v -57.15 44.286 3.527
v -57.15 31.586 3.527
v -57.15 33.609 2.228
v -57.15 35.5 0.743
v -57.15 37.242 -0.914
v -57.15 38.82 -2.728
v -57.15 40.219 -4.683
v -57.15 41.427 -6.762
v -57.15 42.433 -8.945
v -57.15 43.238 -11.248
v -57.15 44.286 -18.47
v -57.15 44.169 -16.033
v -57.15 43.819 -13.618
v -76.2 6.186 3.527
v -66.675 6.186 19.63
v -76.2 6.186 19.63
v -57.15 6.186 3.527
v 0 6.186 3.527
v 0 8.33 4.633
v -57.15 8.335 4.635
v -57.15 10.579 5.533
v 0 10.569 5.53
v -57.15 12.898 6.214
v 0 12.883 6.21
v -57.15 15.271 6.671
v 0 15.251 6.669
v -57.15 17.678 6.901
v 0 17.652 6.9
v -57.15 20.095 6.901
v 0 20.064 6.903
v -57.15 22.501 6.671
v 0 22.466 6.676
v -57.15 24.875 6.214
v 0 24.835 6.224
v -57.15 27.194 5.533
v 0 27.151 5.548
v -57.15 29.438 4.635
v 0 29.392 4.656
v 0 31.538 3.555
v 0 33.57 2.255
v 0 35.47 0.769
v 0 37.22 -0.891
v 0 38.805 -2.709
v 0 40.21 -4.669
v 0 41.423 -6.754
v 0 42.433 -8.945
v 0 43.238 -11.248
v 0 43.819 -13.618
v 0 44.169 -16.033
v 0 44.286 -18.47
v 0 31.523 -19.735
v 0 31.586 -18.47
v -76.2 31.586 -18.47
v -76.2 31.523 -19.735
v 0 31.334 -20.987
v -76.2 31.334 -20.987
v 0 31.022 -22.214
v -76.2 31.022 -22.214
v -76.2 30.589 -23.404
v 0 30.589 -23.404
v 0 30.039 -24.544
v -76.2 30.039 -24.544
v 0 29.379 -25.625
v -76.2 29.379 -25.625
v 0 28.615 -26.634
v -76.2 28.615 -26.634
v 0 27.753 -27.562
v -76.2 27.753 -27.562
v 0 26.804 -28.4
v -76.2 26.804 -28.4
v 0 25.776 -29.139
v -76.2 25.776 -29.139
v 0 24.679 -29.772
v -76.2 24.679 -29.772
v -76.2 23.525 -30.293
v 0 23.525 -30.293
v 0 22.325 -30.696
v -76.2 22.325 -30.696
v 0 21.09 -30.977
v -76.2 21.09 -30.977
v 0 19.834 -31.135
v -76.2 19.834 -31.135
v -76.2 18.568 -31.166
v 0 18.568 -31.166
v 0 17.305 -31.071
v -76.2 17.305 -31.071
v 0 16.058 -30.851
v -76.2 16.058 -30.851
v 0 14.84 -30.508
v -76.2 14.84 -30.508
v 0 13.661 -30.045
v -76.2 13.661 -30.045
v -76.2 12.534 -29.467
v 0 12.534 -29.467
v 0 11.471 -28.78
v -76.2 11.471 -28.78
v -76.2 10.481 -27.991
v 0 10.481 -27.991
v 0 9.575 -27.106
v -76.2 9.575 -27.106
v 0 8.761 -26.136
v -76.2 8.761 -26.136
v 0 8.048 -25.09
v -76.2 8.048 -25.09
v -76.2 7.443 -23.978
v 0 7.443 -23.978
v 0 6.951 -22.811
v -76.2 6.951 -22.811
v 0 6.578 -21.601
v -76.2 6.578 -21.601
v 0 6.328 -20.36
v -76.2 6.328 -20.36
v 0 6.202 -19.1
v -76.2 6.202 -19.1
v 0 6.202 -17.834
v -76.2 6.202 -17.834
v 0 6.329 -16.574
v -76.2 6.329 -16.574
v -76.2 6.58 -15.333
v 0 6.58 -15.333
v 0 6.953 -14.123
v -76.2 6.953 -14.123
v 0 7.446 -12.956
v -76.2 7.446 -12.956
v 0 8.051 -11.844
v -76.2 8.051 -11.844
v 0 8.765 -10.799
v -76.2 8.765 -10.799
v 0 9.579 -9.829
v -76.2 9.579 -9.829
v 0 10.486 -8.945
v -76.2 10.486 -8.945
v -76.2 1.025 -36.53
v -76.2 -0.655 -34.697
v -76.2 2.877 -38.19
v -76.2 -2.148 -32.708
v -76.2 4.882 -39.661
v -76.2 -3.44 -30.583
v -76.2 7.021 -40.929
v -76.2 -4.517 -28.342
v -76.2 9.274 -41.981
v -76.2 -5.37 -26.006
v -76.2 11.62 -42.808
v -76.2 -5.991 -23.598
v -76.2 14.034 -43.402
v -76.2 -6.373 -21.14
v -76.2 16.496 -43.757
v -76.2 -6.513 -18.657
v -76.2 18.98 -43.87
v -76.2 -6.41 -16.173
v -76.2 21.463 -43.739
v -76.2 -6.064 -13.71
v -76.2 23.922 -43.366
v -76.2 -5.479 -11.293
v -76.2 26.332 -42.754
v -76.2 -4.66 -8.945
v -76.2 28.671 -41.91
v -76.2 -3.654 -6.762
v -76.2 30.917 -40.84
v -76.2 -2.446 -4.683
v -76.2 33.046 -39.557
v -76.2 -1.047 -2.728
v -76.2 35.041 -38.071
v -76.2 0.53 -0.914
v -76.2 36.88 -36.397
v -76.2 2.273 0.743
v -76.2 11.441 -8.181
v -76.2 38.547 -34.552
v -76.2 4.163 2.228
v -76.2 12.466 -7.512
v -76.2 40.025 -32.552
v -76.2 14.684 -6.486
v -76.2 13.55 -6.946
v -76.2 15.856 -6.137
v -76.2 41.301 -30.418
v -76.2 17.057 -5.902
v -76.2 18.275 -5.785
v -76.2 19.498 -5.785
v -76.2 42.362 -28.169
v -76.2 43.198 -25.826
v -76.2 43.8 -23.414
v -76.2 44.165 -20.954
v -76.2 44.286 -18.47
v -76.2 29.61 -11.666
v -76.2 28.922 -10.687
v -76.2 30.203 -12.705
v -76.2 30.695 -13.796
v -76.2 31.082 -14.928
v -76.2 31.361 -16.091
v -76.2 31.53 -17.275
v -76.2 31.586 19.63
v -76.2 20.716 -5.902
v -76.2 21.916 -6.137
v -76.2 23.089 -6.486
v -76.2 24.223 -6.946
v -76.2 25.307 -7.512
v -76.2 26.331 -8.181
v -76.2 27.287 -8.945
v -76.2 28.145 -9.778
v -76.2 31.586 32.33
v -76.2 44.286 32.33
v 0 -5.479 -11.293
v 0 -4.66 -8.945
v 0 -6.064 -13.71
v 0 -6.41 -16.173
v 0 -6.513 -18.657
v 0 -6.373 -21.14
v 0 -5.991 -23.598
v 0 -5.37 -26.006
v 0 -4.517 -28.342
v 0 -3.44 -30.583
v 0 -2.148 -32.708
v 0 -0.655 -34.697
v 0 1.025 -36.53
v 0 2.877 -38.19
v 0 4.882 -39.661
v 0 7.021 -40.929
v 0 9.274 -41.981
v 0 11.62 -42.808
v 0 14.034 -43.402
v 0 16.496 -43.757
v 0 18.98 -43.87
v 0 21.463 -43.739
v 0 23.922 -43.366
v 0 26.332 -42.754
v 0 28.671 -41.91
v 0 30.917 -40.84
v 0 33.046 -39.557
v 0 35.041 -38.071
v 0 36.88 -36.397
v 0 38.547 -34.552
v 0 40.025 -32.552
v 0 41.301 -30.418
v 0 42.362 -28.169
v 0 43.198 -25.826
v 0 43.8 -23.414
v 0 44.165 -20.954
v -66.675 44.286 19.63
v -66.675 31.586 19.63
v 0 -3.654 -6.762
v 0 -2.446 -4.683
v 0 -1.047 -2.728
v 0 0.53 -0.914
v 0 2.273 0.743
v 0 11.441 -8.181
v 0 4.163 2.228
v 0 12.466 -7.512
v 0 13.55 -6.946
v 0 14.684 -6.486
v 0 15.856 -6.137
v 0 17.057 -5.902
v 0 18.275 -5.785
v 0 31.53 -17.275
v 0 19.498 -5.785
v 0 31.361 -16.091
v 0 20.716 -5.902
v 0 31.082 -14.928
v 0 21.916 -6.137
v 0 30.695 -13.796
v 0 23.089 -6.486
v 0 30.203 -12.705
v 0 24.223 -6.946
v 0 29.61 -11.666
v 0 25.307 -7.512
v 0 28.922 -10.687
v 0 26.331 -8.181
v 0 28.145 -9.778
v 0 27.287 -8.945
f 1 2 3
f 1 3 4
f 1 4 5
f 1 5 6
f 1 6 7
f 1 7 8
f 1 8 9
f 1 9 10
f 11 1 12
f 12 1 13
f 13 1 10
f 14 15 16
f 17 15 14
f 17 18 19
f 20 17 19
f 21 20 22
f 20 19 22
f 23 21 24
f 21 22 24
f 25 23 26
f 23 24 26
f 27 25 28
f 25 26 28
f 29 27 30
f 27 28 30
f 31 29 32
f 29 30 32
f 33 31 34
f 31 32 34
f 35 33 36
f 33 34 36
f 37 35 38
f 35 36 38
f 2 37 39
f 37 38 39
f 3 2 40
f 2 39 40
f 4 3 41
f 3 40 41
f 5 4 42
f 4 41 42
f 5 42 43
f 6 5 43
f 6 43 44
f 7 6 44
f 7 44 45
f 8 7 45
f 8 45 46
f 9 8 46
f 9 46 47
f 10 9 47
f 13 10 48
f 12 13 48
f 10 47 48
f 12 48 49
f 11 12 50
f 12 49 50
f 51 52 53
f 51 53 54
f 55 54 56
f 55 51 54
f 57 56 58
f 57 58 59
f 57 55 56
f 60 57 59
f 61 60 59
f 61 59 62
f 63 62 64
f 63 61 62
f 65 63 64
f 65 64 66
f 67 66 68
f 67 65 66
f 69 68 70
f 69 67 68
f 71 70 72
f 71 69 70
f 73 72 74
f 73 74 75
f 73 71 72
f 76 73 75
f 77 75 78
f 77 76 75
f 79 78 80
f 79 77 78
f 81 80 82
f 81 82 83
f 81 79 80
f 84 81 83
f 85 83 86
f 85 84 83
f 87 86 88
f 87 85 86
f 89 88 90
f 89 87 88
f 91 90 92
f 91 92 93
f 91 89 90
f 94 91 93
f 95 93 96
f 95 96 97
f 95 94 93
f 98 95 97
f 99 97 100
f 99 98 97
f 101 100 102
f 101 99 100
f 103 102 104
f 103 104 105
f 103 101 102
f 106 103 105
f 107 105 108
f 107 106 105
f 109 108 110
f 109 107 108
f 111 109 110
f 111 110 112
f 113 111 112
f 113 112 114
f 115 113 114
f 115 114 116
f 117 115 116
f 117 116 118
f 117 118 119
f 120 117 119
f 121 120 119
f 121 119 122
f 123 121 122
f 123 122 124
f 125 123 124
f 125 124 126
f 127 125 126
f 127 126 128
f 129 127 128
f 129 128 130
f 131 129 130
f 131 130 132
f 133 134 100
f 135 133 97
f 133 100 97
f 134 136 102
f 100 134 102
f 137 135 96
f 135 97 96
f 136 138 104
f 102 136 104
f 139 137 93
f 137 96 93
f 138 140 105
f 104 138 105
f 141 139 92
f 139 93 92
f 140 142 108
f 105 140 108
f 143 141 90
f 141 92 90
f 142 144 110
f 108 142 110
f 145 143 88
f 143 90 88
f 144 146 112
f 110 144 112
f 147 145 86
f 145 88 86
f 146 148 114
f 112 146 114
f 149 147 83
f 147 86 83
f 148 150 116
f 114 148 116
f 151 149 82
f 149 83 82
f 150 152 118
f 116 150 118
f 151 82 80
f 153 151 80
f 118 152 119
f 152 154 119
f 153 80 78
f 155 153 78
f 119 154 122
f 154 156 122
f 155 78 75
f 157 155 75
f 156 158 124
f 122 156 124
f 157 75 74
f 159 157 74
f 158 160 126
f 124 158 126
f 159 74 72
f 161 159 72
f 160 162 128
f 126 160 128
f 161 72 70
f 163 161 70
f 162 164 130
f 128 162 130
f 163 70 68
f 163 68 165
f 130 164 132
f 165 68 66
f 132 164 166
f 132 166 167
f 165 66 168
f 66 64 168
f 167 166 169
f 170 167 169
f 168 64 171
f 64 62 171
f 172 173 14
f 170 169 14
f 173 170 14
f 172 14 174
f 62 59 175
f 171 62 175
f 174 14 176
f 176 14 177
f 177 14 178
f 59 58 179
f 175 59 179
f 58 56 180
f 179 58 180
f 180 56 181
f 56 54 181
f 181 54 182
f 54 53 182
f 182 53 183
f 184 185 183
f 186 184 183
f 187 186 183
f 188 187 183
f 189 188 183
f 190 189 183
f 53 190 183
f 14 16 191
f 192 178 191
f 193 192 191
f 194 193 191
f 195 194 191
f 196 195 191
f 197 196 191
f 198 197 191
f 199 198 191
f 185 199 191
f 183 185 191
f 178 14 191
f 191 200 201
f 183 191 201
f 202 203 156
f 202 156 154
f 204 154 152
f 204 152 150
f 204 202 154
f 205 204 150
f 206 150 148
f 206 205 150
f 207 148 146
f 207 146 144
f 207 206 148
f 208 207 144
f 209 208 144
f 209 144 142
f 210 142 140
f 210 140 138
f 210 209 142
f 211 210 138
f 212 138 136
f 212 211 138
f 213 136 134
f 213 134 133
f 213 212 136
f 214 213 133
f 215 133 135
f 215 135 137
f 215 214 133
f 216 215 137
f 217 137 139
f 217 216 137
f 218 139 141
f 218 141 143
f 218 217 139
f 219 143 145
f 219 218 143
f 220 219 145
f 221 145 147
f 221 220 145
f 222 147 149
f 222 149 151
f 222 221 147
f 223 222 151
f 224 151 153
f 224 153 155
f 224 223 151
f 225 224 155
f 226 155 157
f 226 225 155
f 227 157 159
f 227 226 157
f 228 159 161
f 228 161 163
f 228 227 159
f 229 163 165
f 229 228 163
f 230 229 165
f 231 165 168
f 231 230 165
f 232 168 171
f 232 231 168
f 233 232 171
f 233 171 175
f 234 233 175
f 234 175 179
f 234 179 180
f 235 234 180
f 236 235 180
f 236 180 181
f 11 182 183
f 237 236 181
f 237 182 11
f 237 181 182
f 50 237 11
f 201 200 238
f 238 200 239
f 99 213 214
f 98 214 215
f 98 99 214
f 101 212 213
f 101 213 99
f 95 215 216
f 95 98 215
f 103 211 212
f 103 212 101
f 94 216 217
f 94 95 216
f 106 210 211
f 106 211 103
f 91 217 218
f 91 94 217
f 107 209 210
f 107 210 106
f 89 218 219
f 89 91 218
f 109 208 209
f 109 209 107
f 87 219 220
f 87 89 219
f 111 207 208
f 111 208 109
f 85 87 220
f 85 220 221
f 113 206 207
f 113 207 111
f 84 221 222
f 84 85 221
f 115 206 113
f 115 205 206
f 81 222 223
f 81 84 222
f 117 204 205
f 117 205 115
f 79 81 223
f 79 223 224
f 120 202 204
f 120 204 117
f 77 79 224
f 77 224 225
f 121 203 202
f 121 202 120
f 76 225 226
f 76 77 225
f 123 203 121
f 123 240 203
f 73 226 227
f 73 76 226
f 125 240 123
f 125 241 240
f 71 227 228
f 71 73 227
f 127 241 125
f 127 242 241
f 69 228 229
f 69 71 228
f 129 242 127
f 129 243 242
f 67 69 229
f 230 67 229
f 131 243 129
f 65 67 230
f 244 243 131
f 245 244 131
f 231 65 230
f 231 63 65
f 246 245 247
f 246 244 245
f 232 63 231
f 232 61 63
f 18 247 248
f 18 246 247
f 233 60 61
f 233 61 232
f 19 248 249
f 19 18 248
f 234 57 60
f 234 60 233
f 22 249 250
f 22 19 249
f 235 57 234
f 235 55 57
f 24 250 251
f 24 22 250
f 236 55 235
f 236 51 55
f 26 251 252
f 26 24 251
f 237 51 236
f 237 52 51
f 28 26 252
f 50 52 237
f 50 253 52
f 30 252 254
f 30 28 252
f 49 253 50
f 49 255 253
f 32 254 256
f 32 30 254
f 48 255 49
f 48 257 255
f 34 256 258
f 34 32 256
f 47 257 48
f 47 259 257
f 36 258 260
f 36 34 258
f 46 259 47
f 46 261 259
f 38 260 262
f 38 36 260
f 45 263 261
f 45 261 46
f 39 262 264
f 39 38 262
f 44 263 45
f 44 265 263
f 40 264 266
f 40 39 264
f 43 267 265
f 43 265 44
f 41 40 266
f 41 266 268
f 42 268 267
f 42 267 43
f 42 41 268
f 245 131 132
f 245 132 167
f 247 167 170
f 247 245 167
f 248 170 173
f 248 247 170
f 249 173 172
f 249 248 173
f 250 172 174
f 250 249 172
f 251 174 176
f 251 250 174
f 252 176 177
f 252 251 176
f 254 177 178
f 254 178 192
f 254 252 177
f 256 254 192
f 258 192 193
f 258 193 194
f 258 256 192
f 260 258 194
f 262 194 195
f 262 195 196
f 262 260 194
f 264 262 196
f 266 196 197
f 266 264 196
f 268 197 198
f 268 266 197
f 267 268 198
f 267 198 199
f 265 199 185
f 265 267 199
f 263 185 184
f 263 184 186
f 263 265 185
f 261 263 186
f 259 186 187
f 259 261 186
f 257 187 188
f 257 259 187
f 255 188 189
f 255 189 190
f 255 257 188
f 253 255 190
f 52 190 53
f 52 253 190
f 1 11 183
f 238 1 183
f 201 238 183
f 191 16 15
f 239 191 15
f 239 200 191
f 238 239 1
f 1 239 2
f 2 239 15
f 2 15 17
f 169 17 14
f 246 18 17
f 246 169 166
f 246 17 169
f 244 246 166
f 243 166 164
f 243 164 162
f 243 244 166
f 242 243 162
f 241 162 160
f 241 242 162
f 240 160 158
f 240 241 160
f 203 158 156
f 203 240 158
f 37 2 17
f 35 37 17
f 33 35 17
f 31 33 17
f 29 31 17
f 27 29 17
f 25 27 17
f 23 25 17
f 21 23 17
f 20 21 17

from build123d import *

# Parameters (mm, degrees)
F1_DEPTH = 76.2
F2_DEPTH = 76.2
F3_DEPTH = 57.15
F5_DEPTH = 25.4
F7_DEPTH = 76.2


with BuildPart() as f1:
    # F0 (on Right) → F1 (new body)
    with BuildSketch(Plane.YZ):
        with BuildLine():
            Line((27.286521, -8.945027), (42.432691, -8.945027))
            ThreePointArc((42.432691, -8.945027), (27.150596, 5.547898), (6.186261, 3.527018))
            ThreePointArc((6.186261, 3.527018), (-0.279827, -1.802061), (-4.66017, -8.945027))
            Line((-4.66017, -8.945027), (10.486, -8.945027))
            ThreePointArc((10.486, -8.945027), (18.886261, -5.770027), (27.286521, -8.945027))
        make_face()
        with BuildLine():
            ThreePointArc((-4.66017, -8.945027), (14.034422, -43.402329), (44.286261, -18.470027))
            ThreePointArc((44.286261, -18.470027), (43.818562, -13.618189), (42.432691, -8.945027))
            Line((42.432691, -8.945027), (27.286521, -8.945027))
            ThreePointArc((27.286521, -8.945027), (30.461521, -13.244767), (31.586261, -18.470027))
            ThreePointArc((31.586261, -18.470027), (13.661, -30.045288), (10.486, -8.945027))
            Line((10.486, -8.945027), (-4.66017, -8.945027))
        make_face()
    extrude(amount=-F1_DEPTH)

    # F0 (on Right) → F2 (join)
    with BuildSketch(Plane.YZ):
        with BuildLine():
            ThreePointArc((42.432691, -8.945027), (43.818562, -13.618189), (44.286261, -18.470027))
            Line((44.286261, -18.470027), (44.286261, 32.329973))
            Line((44.286261, 32.329973), (31.586261, 32.329973))
            Line((31.586261, 32.329973), (31.586261, 19.629973))
            Line((31.586261, 19.629973), (6.186261, 19.629973))
            Line((6.186261, 19.629973), (6.186261, 3.527018))
            ThreePointArc((6.186261, 3.527018), (27.150596, 5.547898), (42.432691, -8.945027))
        make_face()
    extrude(amount=-F2_DEPTH)

    # F0 (on Right) → F3 (cut)
    with BuildSketch(Plane.YZ):
        with BuildLine():
            ThreePointArc((42.432691, -8.945027), (43.818562, -13.618189), (44.286261, -18.470027))
            Line((44.286261, -18.470027), (44.286261, 32.329973))
            Line((44.286261, 32.329973), (31.586261, 32.329973))
            Line((31.586261, 32.329973), (31.586261, 19.629973))
            Line((31.586261, 19.629973), (6.186261, 19.629973))
            Line((6.186261, 19.629973), (6.186261, 3.527018))
            ThreePointArc((6.186261, 3.527018), (27.150596, 5.547898), (42.432691, -8.945027))
        make_face()
    extrude(amount=-F3_DEPTH, mode=Mode.SUBTRACT)

    # F4 (on face) → F5 (cut)
    with BuildSketch(Plane.XZ.offset(-31.586261)):
        Polygon((-76.2, 32.329973), (-66.675, 19.629973), (-57.15, 19.629973), (-57.15, 32.329973), align=None)
    extrude(amount=-F5_DEPTH, mode=Mode.SUBTRACT)

    # F6 (on face) → F7 (cut)
    with BuildSketch(Plane.XZ.offset(-6.186261)):
        Polygon((-57.15, 19.629973), (-66.675, 19.629973), (-57.15, 3.527018), align=None)
    extrude(amount=-F7_DEPTH, mode=Mode.SUBTRACT)


solid = f1.part
